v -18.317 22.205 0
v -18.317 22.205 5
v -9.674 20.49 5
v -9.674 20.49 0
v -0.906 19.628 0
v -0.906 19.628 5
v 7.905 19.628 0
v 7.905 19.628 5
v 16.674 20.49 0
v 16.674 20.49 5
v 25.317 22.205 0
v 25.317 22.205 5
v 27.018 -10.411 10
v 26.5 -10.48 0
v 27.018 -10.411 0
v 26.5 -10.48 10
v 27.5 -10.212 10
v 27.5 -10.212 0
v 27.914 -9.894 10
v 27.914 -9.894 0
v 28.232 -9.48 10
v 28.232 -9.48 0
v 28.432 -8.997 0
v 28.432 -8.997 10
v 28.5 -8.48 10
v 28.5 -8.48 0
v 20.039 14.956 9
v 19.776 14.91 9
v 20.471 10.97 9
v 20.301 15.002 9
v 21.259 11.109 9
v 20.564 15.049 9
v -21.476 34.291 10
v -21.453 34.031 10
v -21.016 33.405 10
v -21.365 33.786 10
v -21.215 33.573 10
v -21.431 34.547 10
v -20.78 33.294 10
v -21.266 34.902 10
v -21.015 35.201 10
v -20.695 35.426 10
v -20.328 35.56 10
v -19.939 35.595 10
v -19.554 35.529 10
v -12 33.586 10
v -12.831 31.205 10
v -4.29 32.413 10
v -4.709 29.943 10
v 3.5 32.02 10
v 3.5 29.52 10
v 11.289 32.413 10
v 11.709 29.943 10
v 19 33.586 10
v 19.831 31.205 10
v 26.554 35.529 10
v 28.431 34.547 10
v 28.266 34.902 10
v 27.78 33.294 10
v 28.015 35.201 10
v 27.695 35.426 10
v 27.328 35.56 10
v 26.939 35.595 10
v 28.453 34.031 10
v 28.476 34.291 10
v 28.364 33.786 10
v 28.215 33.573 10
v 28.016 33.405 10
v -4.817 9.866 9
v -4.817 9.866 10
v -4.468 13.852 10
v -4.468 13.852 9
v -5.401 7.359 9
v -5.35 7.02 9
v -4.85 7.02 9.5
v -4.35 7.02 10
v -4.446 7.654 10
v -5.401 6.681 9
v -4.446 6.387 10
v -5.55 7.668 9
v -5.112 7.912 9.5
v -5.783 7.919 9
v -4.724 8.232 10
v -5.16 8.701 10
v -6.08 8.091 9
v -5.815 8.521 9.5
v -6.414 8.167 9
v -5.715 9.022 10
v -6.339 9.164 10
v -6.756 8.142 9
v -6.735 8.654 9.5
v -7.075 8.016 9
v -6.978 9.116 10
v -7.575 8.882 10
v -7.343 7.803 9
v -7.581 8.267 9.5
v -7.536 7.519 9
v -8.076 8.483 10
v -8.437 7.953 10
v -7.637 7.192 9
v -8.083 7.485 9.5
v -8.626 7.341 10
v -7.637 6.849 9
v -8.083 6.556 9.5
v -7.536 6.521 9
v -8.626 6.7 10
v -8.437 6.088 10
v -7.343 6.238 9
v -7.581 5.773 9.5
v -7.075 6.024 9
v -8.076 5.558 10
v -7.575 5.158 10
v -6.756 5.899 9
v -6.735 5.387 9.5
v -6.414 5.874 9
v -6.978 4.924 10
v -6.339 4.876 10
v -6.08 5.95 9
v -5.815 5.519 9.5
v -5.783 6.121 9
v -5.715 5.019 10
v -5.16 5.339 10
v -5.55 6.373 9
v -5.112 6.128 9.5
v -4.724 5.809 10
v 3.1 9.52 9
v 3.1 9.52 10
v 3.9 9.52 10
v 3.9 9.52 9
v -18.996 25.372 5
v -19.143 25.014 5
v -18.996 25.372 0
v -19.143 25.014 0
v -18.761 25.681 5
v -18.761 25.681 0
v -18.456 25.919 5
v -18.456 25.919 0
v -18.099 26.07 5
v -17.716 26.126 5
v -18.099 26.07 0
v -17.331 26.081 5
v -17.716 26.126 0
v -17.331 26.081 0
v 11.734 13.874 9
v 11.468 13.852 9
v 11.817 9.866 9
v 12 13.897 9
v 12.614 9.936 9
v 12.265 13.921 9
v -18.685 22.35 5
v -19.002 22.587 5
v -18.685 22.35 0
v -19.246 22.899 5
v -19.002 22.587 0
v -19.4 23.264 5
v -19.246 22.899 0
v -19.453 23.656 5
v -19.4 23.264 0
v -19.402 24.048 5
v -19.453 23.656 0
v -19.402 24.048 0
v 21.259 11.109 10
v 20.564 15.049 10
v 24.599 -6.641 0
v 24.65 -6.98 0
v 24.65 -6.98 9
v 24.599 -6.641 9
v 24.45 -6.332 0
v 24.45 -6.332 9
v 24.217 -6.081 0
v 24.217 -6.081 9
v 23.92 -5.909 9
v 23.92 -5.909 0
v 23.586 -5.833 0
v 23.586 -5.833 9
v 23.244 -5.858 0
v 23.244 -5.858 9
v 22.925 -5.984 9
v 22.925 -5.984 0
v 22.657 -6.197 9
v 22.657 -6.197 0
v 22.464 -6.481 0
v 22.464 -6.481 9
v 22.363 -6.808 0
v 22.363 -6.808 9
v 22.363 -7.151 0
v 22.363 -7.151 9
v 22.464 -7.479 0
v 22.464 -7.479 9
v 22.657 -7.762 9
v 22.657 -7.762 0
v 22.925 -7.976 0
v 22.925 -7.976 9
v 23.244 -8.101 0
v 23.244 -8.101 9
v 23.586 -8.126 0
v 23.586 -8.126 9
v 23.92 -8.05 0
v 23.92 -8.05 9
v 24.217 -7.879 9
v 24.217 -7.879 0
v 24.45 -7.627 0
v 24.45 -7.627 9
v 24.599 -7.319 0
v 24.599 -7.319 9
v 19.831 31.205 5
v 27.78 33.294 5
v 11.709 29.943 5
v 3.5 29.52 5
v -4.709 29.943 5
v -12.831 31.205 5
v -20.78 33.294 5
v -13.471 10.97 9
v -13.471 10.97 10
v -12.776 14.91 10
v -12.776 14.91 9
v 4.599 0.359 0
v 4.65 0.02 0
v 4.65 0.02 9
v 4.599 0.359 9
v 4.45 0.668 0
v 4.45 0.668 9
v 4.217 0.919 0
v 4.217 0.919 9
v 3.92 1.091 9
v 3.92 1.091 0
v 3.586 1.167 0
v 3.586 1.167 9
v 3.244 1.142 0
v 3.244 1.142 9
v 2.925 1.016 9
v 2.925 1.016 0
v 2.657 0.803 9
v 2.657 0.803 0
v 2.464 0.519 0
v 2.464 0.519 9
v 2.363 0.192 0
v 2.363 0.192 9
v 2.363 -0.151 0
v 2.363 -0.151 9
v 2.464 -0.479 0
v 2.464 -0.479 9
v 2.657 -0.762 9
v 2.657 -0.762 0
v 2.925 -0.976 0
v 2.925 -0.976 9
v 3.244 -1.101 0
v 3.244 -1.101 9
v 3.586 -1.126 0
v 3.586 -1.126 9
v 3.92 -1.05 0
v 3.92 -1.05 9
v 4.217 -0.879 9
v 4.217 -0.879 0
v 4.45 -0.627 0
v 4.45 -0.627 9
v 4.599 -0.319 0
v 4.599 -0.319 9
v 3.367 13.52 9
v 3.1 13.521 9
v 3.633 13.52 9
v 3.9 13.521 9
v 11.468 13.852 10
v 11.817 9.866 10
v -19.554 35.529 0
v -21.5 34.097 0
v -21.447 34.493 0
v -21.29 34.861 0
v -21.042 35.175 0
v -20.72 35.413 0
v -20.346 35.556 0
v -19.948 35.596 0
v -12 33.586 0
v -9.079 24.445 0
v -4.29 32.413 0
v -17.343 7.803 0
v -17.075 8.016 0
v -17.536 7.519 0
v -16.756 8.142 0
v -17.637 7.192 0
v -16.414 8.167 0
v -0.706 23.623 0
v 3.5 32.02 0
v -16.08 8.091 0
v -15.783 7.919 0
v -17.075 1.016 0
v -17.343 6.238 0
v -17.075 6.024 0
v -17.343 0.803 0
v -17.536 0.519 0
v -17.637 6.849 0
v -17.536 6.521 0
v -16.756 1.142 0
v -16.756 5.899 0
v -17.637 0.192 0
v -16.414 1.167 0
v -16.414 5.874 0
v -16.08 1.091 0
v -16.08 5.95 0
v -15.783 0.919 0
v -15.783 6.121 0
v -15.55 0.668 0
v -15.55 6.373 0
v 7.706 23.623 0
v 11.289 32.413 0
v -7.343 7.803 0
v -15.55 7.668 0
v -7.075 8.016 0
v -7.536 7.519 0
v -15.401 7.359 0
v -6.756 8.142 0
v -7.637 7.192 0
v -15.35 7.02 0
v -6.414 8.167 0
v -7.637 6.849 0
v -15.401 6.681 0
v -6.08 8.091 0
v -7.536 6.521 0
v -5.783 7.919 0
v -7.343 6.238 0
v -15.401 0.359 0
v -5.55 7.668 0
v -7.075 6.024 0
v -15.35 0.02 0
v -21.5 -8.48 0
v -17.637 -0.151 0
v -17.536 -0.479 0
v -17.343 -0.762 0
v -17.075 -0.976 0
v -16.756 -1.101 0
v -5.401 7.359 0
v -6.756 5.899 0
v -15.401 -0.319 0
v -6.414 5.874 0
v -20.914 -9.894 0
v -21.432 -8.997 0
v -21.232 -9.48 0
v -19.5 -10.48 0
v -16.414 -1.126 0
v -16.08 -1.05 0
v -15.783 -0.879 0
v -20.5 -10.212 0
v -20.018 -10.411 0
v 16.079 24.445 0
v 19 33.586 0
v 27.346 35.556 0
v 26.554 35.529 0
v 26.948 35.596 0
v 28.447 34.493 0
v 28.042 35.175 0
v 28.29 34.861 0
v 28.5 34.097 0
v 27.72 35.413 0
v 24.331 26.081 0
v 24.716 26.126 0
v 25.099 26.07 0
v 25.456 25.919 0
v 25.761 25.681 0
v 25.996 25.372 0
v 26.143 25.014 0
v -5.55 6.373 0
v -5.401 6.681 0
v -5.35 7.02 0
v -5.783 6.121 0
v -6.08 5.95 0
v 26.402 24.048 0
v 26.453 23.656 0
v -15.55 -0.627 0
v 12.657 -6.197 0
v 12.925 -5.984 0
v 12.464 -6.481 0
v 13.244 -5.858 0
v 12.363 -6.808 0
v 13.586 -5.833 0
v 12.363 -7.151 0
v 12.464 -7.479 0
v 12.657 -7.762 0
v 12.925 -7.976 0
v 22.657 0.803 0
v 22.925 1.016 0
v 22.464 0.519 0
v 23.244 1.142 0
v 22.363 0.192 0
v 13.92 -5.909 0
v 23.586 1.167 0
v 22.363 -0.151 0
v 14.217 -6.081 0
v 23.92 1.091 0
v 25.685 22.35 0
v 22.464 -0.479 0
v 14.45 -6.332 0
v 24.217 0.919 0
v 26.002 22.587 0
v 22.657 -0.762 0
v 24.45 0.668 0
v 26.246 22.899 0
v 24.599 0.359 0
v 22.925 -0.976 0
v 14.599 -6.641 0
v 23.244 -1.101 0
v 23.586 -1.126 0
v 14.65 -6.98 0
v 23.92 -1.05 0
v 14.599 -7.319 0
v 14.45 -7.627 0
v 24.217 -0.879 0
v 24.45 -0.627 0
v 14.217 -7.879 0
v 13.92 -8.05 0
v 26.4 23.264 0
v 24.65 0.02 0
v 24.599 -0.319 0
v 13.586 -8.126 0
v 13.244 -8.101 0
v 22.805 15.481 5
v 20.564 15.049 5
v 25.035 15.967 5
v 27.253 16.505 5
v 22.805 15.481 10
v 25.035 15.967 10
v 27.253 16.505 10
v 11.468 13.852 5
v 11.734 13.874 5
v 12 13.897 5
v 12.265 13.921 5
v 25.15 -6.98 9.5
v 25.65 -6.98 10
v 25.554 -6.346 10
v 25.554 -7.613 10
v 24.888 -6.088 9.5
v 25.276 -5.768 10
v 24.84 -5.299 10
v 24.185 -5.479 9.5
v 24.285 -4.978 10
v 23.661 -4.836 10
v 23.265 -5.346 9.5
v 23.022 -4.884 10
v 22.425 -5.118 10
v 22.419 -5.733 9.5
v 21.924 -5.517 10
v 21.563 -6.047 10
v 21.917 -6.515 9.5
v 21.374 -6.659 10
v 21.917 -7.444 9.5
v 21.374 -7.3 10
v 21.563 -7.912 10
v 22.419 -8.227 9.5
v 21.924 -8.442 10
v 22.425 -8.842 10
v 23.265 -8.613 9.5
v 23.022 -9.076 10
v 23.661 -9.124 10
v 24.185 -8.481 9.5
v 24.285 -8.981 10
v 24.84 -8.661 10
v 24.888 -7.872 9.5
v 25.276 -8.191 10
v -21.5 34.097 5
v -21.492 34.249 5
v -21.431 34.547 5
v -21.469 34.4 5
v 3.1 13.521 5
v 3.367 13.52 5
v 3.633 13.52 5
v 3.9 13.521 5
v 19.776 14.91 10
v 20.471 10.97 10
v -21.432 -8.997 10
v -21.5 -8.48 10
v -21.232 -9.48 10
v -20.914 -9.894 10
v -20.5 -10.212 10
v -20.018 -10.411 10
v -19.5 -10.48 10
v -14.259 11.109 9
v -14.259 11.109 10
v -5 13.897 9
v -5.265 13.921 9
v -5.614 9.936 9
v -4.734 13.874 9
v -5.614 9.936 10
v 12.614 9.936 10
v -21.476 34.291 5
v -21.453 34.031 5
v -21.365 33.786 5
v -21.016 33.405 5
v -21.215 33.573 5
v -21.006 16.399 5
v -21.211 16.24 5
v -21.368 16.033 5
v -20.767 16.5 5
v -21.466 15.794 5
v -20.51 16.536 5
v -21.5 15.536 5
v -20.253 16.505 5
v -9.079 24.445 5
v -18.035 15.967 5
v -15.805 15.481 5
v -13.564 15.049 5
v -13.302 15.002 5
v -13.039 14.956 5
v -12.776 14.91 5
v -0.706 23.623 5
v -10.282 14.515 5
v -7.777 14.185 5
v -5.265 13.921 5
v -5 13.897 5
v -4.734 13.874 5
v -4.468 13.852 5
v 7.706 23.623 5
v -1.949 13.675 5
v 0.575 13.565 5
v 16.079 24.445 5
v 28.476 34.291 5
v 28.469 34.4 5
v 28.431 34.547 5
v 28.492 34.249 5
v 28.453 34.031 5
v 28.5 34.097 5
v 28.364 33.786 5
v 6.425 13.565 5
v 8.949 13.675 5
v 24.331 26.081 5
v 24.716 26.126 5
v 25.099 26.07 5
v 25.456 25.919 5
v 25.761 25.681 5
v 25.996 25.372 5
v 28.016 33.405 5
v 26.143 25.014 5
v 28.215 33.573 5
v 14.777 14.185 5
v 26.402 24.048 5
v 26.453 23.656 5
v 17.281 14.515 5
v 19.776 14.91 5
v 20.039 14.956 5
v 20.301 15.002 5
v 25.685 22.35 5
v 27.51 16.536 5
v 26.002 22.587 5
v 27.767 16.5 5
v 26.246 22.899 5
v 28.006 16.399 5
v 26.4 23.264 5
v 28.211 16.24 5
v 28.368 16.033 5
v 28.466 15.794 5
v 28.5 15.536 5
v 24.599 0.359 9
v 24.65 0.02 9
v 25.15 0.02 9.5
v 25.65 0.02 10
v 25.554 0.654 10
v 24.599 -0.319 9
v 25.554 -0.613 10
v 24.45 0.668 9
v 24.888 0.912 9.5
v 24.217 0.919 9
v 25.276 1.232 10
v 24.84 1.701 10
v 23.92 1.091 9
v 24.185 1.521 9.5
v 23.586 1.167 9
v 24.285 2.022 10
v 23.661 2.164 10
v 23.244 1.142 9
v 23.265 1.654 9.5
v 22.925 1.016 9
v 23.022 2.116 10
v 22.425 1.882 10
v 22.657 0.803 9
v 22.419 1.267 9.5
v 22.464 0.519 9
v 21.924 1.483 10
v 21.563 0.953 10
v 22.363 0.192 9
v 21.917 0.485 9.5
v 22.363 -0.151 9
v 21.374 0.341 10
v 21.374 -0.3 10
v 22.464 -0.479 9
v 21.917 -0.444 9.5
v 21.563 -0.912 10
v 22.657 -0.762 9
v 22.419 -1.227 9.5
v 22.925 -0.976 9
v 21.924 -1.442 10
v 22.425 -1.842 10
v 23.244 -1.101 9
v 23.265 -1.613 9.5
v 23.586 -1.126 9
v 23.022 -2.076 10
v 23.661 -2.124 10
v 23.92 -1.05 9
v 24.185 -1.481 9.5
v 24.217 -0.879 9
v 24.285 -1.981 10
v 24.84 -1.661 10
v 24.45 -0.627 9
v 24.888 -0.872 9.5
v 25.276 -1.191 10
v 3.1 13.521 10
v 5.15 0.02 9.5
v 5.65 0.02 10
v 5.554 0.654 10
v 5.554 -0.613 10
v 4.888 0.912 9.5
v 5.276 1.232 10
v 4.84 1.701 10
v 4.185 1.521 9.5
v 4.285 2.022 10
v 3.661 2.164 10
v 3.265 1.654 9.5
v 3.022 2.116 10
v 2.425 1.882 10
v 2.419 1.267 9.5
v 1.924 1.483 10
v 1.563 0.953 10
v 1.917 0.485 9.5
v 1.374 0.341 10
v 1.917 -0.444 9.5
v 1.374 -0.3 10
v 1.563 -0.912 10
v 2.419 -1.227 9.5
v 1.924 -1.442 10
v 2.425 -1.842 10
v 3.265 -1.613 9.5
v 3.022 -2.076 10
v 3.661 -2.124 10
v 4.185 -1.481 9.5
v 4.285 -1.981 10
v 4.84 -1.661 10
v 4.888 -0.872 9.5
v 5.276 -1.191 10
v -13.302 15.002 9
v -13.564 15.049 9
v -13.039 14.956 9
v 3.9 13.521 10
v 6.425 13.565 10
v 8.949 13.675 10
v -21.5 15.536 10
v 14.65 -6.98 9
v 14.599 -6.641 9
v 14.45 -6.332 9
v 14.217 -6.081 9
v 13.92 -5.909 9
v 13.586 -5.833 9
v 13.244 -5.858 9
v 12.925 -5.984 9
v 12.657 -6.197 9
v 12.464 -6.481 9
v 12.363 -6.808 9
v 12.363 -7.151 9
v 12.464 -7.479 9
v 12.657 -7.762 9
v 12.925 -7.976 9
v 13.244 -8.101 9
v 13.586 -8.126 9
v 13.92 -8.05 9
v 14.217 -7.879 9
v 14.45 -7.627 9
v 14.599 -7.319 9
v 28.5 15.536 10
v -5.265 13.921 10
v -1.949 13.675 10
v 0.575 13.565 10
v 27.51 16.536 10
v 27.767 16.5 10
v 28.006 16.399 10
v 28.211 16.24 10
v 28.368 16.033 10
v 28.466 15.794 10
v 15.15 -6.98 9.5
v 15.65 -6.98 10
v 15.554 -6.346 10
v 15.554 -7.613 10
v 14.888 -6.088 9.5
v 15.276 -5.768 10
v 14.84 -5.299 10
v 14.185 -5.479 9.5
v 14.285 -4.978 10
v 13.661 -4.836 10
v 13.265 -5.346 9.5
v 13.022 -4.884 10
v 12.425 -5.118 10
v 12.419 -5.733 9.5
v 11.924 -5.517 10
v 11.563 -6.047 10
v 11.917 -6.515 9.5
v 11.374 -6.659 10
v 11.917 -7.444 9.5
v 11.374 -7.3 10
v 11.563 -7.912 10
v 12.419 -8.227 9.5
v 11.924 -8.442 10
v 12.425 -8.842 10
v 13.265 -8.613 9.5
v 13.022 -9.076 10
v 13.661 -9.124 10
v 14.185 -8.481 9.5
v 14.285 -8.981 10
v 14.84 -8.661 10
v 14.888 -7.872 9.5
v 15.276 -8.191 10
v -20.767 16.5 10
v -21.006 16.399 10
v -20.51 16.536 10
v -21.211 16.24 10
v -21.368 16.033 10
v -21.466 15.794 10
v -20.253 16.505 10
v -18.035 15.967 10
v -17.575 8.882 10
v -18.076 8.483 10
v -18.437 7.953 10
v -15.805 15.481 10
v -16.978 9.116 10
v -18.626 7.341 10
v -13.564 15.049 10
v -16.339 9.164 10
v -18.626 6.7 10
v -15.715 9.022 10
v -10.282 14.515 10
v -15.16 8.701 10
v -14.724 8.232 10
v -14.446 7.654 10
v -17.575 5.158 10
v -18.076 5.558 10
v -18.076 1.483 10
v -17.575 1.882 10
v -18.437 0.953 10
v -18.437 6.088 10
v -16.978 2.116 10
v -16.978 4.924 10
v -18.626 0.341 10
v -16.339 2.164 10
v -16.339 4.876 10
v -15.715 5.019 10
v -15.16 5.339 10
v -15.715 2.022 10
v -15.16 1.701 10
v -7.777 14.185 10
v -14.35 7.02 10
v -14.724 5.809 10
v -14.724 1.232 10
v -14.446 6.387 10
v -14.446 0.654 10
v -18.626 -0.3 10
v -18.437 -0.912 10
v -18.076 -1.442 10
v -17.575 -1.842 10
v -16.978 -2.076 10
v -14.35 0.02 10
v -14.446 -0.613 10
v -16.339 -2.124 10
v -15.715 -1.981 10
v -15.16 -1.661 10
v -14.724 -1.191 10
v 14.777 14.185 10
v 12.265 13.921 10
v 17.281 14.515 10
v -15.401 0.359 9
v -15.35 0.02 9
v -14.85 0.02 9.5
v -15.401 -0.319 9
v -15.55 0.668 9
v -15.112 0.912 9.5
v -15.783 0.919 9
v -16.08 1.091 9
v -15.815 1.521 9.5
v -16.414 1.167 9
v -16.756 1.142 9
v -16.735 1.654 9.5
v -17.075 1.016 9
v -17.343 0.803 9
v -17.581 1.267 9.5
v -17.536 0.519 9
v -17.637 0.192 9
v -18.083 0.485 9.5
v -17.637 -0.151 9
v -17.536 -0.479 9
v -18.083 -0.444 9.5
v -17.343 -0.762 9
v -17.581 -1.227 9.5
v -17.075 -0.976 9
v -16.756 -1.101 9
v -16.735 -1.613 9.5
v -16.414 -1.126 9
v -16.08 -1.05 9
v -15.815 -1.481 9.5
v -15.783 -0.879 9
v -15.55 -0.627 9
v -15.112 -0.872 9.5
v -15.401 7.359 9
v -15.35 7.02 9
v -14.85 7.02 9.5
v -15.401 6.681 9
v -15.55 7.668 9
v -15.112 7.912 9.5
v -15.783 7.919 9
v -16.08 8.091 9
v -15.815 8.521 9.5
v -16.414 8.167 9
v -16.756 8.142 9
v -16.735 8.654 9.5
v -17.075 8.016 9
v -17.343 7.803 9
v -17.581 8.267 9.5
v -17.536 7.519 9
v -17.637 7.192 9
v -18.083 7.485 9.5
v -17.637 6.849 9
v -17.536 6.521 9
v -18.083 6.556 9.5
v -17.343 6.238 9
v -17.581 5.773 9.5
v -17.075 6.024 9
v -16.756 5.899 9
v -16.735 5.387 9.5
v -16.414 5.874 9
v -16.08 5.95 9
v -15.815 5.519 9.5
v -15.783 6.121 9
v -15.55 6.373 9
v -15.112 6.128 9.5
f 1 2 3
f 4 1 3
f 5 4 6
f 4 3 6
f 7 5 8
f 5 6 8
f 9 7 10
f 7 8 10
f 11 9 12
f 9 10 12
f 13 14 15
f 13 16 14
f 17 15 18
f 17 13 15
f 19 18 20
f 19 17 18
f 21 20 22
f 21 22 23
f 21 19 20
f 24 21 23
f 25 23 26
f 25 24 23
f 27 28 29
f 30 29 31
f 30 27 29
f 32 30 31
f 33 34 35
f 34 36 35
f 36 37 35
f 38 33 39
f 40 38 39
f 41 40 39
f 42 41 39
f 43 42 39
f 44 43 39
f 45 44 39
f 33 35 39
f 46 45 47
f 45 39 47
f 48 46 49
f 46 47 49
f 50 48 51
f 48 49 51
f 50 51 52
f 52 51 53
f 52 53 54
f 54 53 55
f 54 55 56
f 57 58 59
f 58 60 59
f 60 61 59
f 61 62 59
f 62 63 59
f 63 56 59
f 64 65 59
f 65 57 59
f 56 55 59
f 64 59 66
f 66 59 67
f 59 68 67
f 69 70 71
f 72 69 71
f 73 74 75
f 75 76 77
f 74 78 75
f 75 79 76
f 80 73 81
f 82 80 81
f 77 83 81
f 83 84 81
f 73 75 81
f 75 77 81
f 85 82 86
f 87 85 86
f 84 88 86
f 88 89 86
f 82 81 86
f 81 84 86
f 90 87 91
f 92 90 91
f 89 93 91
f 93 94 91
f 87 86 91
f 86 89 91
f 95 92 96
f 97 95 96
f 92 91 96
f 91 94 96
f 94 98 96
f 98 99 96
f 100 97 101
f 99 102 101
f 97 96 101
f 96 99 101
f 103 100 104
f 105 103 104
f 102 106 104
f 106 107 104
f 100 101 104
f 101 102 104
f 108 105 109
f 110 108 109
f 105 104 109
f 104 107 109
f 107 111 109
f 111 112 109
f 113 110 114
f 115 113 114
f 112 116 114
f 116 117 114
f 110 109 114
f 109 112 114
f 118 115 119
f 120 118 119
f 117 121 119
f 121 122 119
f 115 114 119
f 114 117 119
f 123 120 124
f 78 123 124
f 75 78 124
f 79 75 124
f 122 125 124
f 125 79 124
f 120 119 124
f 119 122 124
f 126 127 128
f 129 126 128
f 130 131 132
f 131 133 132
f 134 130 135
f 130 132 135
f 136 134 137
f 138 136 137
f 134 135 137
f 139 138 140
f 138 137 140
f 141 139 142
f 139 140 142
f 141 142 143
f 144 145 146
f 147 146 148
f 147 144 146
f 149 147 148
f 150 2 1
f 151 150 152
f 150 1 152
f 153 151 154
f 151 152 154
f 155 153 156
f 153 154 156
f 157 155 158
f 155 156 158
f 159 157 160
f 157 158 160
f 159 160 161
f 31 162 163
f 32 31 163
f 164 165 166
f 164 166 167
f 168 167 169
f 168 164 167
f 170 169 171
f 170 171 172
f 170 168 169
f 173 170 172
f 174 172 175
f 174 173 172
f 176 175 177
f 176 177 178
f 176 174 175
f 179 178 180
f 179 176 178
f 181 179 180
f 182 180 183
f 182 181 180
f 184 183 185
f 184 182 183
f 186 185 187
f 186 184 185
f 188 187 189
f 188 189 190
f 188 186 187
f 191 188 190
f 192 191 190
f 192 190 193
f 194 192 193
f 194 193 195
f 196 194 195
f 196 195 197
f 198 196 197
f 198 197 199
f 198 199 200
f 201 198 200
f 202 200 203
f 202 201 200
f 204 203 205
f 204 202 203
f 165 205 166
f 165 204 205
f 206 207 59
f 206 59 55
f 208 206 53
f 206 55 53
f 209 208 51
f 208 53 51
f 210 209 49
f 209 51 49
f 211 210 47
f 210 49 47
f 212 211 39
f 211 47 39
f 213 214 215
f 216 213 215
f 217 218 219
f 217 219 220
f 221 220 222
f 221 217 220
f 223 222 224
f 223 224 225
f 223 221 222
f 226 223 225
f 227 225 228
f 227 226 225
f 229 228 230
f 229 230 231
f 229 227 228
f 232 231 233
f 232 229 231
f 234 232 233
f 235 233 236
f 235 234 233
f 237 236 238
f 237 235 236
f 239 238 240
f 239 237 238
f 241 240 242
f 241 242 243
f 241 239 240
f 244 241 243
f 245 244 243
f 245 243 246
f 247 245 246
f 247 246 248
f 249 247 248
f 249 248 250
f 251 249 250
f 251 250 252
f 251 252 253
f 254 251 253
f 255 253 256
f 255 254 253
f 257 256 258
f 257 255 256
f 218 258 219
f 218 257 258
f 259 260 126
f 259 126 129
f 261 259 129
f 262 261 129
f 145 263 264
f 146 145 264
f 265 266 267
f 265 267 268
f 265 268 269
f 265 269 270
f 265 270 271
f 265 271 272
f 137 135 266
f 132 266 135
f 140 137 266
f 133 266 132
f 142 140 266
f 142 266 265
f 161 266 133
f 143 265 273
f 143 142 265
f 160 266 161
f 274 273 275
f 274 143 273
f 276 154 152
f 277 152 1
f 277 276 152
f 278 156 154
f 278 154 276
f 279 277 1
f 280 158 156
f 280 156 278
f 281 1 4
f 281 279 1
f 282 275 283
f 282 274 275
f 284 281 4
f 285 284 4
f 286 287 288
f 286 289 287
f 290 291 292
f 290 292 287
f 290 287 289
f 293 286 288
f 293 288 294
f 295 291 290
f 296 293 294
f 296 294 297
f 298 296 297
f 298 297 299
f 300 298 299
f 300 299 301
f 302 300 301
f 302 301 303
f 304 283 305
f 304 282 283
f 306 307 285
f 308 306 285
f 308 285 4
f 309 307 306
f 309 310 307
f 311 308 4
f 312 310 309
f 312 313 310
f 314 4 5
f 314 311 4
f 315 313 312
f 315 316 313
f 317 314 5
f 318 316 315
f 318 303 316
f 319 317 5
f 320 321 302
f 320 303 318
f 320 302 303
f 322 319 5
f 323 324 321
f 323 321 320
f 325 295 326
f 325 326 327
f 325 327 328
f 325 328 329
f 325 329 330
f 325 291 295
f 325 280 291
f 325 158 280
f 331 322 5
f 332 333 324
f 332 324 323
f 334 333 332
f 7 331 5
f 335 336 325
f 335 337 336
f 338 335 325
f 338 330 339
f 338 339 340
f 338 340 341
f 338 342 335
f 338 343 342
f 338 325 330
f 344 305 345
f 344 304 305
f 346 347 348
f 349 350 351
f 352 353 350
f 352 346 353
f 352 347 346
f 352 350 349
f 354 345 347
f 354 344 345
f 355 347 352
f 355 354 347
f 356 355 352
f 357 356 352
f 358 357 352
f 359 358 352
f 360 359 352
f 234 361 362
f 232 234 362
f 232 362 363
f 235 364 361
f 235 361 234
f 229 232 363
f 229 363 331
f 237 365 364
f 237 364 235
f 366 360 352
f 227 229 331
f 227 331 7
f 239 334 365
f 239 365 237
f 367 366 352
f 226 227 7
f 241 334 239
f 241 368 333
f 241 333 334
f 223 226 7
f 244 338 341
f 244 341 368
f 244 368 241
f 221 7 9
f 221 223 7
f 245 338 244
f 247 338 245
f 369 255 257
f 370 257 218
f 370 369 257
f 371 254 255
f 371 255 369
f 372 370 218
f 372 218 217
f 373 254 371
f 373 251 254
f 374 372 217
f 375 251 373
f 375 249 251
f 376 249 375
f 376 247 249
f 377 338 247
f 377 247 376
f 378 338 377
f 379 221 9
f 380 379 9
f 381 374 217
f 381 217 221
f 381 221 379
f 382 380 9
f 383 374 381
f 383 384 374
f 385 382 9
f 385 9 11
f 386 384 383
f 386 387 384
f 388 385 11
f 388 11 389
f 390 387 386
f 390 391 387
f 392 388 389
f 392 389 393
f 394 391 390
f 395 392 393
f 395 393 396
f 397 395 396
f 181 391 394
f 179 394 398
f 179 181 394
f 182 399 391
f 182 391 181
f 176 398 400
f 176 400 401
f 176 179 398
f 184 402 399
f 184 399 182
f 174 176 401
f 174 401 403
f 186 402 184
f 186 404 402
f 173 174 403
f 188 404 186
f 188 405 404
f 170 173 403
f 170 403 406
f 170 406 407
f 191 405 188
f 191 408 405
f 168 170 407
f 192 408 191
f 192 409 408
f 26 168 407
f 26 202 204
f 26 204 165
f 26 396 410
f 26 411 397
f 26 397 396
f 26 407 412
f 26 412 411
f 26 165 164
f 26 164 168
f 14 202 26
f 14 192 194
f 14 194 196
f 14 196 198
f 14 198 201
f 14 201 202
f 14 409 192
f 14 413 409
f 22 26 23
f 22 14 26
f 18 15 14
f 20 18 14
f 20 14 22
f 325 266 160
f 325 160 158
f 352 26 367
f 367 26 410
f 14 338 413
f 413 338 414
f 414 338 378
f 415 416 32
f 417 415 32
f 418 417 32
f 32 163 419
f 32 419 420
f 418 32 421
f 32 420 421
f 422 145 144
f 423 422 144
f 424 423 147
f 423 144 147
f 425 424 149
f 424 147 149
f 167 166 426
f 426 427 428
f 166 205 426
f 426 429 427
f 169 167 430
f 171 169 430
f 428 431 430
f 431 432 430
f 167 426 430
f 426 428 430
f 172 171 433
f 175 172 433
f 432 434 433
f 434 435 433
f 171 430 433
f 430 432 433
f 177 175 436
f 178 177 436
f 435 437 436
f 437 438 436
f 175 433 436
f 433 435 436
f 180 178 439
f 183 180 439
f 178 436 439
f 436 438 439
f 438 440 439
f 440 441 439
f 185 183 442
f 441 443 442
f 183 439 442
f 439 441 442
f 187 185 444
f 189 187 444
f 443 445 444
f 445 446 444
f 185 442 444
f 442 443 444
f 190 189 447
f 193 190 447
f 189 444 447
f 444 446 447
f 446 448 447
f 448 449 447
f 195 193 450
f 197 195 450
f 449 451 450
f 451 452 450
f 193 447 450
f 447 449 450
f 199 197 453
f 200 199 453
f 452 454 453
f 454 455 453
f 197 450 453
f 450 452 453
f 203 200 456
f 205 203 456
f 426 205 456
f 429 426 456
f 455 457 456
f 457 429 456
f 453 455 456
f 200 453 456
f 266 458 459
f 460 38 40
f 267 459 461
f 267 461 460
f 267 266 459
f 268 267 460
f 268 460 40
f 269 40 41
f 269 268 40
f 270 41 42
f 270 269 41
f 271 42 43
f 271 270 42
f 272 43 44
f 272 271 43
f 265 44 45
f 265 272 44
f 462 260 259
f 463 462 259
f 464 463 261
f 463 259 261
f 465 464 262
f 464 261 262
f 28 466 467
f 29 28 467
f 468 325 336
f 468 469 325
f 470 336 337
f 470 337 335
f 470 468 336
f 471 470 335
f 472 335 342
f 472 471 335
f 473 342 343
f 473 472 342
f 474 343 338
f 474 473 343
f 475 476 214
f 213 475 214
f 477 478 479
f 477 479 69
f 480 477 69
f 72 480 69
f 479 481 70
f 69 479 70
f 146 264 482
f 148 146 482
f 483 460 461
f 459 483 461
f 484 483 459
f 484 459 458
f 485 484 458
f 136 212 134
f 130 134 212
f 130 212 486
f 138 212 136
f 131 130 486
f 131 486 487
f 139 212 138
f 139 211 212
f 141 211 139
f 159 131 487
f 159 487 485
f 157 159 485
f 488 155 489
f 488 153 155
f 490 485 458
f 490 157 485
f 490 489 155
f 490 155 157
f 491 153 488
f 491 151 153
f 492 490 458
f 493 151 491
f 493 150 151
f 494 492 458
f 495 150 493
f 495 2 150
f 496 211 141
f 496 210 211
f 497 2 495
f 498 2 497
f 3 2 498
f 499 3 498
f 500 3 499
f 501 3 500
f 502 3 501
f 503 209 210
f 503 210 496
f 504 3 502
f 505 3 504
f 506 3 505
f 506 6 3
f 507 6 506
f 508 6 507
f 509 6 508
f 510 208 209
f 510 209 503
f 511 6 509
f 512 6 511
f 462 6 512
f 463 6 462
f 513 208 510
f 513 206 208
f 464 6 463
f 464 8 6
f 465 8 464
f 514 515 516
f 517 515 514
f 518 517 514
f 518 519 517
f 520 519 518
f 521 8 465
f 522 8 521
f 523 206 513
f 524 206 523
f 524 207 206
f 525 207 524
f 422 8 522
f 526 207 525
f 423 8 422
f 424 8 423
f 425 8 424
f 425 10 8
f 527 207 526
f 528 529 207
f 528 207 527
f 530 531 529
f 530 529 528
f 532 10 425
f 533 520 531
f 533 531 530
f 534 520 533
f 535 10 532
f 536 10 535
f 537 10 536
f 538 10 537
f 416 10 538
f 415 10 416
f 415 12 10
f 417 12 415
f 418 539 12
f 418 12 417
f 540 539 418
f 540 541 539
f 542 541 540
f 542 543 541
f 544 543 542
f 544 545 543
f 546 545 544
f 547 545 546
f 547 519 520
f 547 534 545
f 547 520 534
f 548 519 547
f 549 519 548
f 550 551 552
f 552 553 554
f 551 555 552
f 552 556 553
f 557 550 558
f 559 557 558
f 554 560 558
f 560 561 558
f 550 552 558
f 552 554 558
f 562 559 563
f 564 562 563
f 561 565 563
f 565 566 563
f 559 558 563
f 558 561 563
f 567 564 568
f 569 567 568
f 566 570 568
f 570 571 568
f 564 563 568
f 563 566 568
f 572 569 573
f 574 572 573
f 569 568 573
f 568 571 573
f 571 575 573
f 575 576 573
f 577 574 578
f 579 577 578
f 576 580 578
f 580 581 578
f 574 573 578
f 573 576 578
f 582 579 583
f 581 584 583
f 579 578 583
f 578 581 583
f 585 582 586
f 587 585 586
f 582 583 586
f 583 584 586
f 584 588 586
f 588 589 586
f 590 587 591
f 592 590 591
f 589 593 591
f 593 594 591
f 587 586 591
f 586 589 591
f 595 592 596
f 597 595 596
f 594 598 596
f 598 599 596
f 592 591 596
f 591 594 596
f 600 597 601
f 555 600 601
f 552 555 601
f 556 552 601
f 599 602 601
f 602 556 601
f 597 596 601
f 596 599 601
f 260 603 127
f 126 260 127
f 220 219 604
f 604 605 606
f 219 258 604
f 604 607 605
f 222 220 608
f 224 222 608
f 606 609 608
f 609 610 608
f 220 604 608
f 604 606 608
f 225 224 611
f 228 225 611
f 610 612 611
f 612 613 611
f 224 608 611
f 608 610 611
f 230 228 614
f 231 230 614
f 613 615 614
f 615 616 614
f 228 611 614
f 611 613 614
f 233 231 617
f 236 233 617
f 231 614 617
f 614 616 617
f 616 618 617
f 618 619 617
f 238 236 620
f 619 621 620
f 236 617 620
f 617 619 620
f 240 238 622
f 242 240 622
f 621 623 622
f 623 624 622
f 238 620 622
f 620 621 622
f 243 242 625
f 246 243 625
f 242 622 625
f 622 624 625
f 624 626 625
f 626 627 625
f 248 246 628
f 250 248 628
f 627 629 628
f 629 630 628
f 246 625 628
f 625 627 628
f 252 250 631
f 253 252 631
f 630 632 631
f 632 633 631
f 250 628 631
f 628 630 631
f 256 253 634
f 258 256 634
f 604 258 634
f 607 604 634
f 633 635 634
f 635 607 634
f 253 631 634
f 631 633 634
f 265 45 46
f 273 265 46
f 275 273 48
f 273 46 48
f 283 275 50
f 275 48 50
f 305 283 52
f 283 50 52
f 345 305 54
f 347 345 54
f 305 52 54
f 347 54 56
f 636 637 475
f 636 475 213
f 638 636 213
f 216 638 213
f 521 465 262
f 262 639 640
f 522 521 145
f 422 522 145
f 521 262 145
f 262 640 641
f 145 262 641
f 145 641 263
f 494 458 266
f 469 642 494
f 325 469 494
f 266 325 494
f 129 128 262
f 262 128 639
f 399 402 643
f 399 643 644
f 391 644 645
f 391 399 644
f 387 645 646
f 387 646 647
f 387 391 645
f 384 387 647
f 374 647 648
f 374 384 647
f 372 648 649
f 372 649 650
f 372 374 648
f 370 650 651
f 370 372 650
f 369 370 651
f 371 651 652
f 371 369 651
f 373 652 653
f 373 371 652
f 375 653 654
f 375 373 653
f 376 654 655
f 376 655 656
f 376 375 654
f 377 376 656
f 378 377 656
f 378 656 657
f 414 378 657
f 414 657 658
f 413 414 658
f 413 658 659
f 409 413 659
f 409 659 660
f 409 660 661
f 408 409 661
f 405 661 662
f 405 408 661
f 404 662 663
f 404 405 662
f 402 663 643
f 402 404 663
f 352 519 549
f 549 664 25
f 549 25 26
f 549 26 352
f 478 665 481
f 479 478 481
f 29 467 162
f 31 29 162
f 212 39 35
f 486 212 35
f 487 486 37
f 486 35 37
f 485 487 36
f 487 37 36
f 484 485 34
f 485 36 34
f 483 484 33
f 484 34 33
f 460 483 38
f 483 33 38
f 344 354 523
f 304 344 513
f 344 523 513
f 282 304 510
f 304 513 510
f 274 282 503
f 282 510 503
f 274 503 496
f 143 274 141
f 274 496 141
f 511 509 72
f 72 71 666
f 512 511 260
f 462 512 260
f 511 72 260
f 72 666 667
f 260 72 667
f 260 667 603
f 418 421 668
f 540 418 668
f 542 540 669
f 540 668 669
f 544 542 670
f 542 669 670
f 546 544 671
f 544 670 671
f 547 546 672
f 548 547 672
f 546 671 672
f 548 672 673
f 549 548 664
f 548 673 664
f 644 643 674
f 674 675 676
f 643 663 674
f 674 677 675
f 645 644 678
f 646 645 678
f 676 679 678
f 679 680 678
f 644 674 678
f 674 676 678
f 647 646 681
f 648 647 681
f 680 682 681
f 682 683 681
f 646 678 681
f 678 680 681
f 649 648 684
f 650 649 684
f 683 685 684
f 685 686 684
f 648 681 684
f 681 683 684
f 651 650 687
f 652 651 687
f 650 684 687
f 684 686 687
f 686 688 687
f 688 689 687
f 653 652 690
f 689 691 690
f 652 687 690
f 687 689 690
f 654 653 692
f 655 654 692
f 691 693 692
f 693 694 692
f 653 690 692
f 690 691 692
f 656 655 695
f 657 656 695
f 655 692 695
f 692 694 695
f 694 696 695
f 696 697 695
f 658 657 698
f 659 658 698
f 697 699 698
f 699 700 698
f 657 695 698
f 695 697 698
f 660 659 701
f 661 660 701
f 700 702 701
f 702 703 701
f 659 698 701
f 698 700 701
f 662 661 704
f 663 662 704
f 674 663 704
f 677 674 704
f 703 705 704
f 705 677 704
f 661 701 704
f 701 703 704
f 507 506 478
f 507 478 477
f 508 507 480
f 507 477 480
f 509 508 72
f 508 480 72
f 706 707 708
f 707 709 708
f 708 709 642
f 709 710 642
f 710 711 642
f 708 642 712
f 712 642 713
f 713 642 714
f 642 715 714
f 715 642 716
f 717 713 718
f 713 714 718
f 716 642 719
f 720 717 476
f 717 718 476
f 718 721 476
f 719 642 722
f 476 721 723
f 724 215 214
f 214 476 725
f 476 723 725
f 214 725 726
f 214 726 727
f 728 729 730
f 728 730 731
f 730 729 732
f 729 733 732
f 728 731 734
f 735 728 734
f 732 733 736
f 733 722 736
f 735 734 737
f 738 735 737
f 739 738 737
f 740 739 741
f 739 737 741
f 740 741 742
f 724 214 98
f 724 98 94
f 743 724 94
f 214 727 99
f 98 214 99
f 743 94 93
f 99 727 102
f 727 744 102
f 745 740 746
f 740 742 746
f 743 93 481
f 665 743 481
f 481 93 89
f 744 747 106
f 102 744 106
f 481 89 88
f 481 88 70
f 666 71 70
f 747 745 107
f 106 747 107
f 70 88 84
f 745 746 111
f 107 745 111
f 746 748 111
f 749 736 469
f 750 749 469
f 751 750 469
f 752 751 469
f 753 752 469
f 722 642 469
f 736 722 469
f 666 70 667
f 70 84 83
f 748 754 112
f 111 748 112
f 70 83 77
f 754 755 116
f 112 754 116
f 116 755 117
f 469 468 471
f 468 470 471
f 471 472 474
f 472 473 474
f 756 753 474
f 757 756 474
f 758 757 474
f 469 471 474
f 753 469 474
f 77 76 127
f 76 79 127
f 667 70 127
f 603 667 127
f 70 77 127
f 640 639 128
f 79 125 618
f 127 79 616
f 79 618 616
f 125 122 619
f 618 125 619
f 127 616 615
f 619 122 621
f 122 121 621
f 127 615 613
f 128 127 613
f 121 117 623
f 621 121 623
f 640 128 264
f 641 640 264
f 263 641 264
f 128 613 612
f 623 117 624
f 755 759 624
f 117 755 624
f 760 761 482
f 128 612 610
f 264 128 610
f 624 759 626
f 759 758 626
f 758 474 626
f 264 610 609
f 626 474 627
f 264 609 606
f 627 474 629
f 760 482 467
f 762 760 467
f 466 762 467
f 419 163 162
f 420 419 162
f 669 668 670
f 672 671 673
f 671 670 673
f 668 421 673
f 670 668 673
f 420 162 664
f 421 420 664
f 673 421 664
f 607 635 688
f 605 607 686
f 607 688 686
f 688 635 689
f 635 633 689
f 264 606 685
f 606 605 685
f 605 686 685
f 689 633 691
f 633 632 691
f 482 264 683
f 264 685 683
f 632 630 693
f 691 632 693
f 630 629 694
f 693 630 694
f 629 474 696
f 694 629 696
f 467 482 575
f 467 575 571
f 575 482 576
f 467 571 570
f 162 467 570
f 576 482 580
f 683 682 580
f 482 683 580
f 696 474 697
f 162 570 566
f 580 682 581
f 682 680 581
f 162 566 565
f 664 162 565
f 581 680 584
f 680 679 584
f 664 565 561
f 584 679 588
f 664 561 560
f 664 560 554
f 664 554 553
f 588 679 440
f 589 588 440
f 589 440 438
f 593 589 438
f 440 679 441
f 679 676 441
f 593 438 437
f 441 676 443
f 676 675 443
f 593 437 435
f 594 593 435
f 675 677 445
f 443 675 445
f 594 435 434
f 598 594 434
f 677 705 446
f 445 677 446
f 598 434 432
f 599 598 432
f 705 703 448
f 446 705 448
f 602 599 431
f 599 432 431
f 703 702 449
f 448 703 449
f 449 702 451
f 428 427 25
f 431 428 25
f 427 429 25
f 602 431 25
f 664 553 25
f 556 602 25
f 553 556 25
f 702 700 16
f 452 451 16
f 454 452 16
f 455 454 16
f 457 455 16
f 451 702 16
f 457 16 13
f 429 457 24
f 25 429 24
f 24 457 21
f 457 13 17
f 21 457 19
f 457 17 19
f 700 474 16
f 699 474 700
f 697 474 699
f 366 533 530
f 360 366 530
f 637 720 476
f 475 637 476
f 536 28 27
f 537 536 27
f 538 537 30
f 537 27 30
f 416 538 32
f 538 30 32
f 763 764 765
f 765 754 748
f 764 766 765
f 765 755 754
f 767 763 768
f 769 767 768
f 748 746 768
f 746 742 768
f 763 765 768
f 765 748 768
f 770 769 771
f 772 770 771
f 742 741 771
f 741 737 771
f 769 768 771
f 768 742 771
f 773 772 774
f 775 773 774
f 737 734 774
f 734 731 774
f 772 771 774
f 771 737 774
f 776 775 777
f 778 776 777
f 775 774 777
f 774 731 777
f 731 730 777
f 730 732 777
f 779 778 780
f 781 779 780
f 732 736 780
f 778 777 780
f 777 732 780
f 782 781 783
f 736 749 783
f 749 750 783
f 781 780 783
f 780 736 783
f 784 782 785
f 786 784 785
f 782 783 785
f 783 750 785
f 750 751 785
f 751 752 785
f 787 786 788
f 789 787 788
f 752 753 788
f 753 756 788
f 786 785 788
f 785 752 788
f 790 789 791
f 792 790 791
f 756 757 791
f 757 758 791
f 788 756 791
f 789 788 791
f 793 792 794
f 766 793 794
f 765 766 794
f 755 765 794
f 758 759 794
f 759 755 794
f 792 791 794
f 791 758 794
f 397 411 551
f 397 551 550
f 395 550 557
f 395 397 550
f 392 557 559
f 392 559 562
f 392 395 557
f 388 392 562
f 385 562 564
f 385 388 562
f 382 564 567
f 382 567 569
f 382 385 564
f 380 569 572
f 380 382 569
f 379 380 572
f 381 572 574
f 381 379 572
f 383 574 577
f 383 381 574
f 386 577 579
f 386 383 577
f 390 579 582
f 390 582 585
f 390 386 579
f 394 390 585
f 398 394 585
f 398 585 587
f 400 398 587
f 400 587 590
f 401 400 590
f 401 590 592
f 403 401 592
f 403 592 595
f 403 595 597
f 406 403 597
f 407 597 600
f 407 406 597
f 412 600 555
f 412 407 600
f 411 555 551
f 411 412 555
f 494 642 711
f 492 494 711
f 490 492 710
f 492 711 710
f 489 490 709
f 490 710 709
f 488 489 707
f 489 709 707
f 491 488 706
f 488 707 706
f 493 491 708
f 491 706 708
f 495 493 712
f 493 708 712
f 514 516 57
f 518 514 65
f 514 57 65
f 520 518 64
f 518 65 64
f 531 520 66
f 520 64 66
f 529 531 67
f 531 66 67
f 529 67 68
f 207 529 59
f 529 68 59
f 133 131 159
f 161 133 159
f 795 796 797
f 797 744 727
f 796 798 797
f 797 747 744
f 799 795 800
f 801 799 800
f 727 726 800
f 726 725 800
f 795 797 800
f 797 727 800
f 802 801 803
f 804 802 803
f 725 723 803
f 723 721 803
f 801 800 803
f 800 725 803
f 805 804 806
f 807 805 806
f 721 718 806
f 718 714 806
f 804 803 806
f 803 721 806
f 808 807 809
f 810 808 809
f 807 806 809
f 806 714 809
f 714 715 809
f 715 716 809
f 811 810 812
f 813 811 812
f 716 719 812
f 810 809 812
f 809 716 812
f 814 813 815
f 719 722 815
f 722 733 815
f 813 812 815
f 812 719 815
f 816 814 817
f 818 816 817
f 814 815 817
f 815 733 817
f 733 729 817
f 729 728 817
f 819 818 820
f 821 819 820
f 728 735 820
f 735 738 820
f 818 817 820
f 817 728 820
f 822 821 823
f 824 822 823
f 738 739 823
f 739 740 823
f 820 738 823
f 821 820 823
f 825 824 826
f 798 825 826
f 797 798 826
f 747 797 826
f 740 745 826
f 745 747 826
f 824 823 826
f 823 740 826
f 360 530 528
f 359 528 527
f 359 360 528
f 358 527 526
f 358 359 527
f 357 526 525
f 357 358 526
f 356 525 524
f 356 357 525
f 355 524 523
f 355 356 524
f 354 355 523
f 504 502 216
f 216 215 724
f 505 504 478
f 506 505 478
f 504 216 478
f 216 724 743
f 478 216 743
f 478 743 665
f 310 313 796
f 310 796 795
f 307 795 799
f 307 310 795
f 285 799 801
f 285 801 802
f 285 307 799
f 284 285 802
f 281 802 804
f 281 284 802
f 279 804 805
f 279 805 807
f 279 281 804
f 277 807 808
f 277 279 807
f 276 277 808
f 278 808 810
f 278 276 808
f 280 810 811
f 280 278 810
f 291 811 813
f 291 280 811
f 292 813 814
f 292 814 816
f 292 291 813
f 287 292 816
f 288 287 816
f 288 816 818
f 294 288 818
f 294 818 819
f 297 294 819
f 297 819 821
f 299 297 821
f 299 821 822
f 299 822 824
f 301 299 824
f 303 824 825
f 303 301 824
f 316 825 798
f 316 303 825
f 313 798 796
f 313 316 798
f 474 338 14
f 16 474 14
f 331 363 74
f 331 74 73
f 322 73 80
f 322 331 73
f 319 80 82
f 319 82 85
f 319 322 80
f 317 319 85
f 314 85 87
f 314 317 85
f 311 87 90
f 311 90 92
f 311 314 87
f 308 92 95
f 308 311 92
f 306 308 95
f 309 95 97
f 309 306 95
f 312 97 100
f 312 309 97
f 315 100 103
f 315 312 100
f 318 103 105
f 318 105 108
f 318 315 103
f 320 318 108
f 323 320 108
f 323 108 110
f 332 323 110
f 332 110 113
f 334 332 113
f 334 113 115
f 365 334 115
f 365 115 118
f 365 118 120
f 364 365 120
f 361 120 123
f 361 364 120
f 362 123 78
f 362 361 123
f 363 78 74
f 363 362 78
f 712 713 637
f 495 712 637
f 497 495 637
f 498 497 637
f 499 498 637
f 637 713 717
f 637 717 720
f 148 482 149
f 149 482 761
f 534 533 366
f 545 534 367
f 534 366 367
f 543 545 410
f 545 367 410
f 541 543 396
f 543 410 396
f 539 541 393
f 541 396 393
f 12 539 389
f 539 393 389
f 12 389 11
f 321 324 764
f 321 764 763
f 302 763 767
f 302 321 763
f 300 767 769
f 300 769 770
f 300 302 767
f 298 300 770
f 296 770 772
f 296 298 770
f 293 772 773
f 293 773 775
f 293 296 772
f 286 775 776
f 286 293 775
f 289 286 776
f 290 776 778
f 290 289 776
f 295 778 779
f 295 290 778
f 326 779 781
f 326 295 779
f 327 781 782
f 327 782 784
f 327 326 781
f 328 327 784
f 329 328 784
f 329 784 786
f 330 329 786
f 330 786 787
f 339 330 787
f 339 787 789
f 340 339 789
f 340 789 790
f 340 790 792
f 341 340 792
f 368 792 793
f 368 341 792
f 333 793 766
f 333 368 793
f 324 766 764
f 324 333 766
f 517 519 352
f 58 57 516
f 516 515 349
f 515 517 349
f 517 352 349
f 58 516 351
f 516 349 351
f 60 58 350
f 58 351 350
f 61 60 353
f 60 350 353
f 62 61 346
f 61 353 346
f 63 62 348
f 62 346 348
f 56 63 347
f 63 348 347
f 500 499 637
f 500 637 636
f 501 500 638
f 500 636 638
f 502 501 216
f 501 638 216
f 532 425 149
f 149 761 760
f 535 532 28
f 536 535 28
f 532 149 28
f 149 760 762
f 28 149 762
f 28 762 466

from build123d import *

# Parameters (mm, degrees)
SKETCH1_W           = 50
SKETCH1_H           = 21
SKETCH1_R           = 1.15
BOSS_EXTRUDE4_DEPTH = 10
CHAMFER2_SIZE       = 1
FILLET2_R           = 2
SKETCH2_W           = 50
SKETCH2_H           = 10
BOSS_EXTRUDE5_DEPTH = 40
CUT_EXTRUDE1_DEPTH  = 73
CUT_EXTRUDE2_DEPTH  = 5
CUT_EXTRUDE3_DEPTH  = 1
FILLET4_R           = 1.5
FILLET6_R           = 1.5
FILLET7_R           = 1


with BuildPart() as part:
    # Sketch1 → Boss-Extrude4 (new body)
    with BuildSketch(Plane.XY):
        with Locations((3.499954481, 0.020373254)):
            Rectangle(SKETCH1_W, SKETCH1_H)
        with Locations((-16.500045519, 0.020373254)):
            Circle(SKETCH1_R, mode=Mode.SUBTRACT)
        with Locations((13.499954481, -6.979626746)):
            Circle(SKETCH1_R, mode=Mode.SUBTRACT)
        with Locations((23.499954481, -6.979626746)):
            Circle(SKETCH1_R, mode=Mode.SUBTRACT)
        with Locations((-16.500045519, 7.020373254)):
            Circle(SKETCH1_R, mode=Mode.SUBTRACT)
        with Locations((-6.500045519, 7.020373254)):
            Circle(SKETCH1_R, mode=Mode.SUBTRACT)
        with Locations((3.499954481, 0.020373254)):
            Circle(SKETCH1_R, mode=Mode.SUBTRACT)
        with Locations((23.499954481, 0.020373254)):
            Circle(SKETCH1_R, mode=Mode.SUBTRACT)
    extrude(amount=BOSS_EXTRUDE4_DEPTH)

    # Chamfer2
    chamfer2_edges = [part.edges().sort_by_distance(p)[0] for p in [
        (22.349954481, 0.020373254, 10),
        (-17.650045519, 0.020373254, 10),
        (-17.650045519, 7.020373254, 10),
        (-7.650045519, 7.020373254, 10),
        (22.349954481, -6.979626746, 10),
        (12.349954481, -6.979626746, 10),
        (2.349954481, 0.020373254, 10),
    ]]
    chamfer(chamfer2_edges, length=CHAMFER2_SIZE)

    # Fillet2
    fillet2_edges = [part.edges().sort_by_distance(p)[0] for p in [
        (28.499954481, -10.479626746, 5),
        (-21.500045519, -10.479626746, 5),
    ]]
    fillet(fillet2_edges, radius=FILLET2_R)

    # Sketch2 → Boss-Extrude5 (add)
    with BuildSketch(Plane(origin=(0, 10.520373254, 0), x_dir=(1, 0, 0), z_dir=(0, 1, 0))):
        with Locations((3.499954481, -5)):
            Rectangle(SKETCH2_W, SKETCH2_H)
    extrude(amount=BOSS_EXTRUDE5_DEPTH)

    # Sketch4 → Cut-Extrude1 (cut)
    with BuildSketch(Plane.XY.offset(10)):
        with BuildLine():
            Line((26.79366854, 22.587048888), (25.75839236, 26.450752193))
            ThreePointArc((25.75839236, 26.450752193), (3.499954481, 23.520373254), (-18.758483398, 26.450752193))
            Line((-18.758483398, 26.450752193), (-19.793759578, 22.587048888))
            ThreePointArc((-19.793759578, 22.587048888), (3.499954481, 19.520373254), (26.79366854, 22.587048888))
        make_face()
        with BuildLine():
            ThreePointArc((-21.500045519, 36.163369499), (3.499954481, 32.020373254), (28.499954481, 36.163369499))
            Line((28.499954481, 36.163369499), (28.499954481, 50.520373254))
            Line((28.499954481, 50.520373254), (-21.500045519, 50.520373254))
            Line((-21.500045519, 50.520373254), (-21.500045519, 36.163369499))
        make_face()
    extrude(amount=-CUT_EXTRUDE1_DEPTH, mode=Mode.SUBTRACT)

    # Sketch4<3> → Cut-Extrude2 (cut)
    with BuildSketch(Plane.XY.offset(10)):
        with BuildLine():
            Line((28.499954481, 17.764584387), (28.499954481, 23.062290925))
            ThreePointArc((28.499954481, 23.062290925), (27.647980656, 22.820472263), (26.79366854, 22.587048888))
            ThreePointArc((26.79366854, 22.587048888), (3.499954481, 19.520373254), (-19.793759578, 22.587048888))
            ThreePointArc((-19.793759578, 22.587048888), (-20.648071694, 22.820472263), (-21.500045519, 23.062290925))
            Line((-21.500045519, 23.062290925), (-21.500045519, 17.764584387))
            Line((-21.500045519, 17.764584387), (-20.697767999, 20.758724854))
            Line((-20.697767999, 20.758724854), (-19.925027338, 20.551669618))
            Line((-19.925027338, 20.551669618), (-20.960087835, 16.688771254))
            ThreePointArc((-20.960087835, 16.688771254), (-17.278248457, 15.795956571), (-13.564048969, 15.049108913))
            Line((-13.564048969, 15.049108913), (-12.869600966, 18.987519248))
            Line((-12.869600966, 18.987519248), (-12.081754763, 18.848600706))
            Line((-12.081754763, 18.848600706), (-12.776202766, 14.910190371))
            ThreePointArc((-12.776202766, 14.910190371), (-9.030559972, 14.341666562), (-5.265402072, 13.9213747))
            Line((-5.265402072, 13.9213747), (-4.916851731, 17.905323327))
            Line((-4.916851731, 17.905323327), (-4.119895973, 17.835598733))
            Line((-4.119895973, 17.835598733), (-4.468446314, 13.851650106))
            ThreePointArc((-4.468446314, 13.851650106), (-0.687506706, 13.611743982), (3.099954481, 13.521206591))
            Line((3.099954481, 13.521206591), (3.099954481, 17.520373254))
            Line((3.099954481, 17.520373254), (3.899954481, 17.520373254))
            Line((3.899954481, 17.520373254), (3.899954481, 13.521206591))
            ThreePointArc((3.899954481, 13.521206591), (7.687415668, 13.611743982), (11.468355275, 13.851650106))
            Line((11.468355275, 13.851650106), (11.119804934, 17.835598733))
            Line((11.119804934, 17.835598733), (11.916760693, 17.905323327))
            Line((11.916760693, 17.905323327), (12.265311034, 13.9213747))
            ThreePointArc((12.265311034, 13.9213747), (16.030468934, 14.341666562), (19.776111728, 14.910190371))
            Line((19.776111728, 14.910190371), (19.081663725, 18.848600706))
            Line((19.081663725, 18.848600706), (19.869509927, 18.987519248))
            Line((19.869509927, 18.987519248), (20.563957931, 15.049108913))
            ThreePointArc((20.563957931, 15.049108913), (24.278157419, 15.795956571), (27.959996797, 16.688771254))
            Line((27.959996797, 16.688771254), (26.9249363, 20.551669618))
            Line((26.9249363, 20.551669618), (27.697676961, 20.758724854))
            Line((27.697676961, 20.758724854), (28.499954481, 17.764584387))
        make_face()
        with BuildLine():
            ThreePointArc((25.75839236, 26.450752193), (27.132420907, 26.831156723), (28.499954481, 27.234286946))
            Line((28.499954481, 27.234286946), (28.499954481, 33.526952486))
            ThreePointArc((28.499954481, 33.526952486), (3.499954481, 29.520373254), (-21.500045519, 33.526952486))
            Line((-21.500045519, 33.526952486), (-21.500045519, 27.234286946))
            ThreePointArc((-21.500045519, 27.234286946), (-20.132511945, 26.831156723), (-18.758483398, 26.450752193))
            ThreePointArc((-18.758483398, 26.450752193), (3.499954481, 23.520373254), (25.75839236, 26.450752193))
        make_face()
        with BuildLine():
            Line((28.499954481, 23.062290925), (28.499954481, 27.234286946))
            ThreePointArc((28.499954481, 27.234286946), (27.132420907, 26.831156723), (25.75839236, 26.450752193))
            Line((25.75839236, 26.450752193), (26.79366854, 22.587048888))
            ThreePointArc((26.79366854, 22.587048888), (27.647980656, 22.820472263), (28.499954481, 23.062290925))
        make_face()
        with BuildLine():
            ThreePointArc((-18.758483398, 26.450752193), (-20.132511945, 26.831156723), (-21.500045519, 27.234286946))
            Line((-21.500045519, 27.234286946), (-21.500045519, 23.062290925))
            ThreePointArc((-21.500045519, 23.062290925), (-20.648071694, 22.820472263), (-19.793759578, 22.587048888))
            Line((-19.793759578, 22.587048888), (-18.758483398, 26.450752193))
        make_face()
        with BuildLine():
            Line((28.499954481, 16.832725749), (28.499954481, 17.764584387))
            Line((28.499954481, 17.764584387), (27.697676961, 20.758724854))
            Line((27.697676961, 20.758724854), (26.9249363, 20.551669618))
            Line((26.9249363, 20.551669618), (27.959996797, 16.688771254))
            ThreePointArc((27.959996797, 16.688771254), (28.230080384, 16.760355613), (28.499954481, 16.832725749))
        make_face()
        with BuildLine():
            ThreePointArc((19.776111728, 14.910190371), (20.170179537, 14.978828965), (20.563957931, 15.049108913))
            Line((20.563957931, 15.049108913), (19.869509927, 18.987519248))
            Line((19.869509927, 18.987519248), (19.081663725, 18.848600706))
            Line((19.081663725, 18.848600706), (19.776111728, 14.910190371))
        make_face()
        with BuildLine():
            ThreePointArc((11.468355275, 13.851650106), (11.866905785, 13.885682238), (12.265311034, 13.9213747))
            Line((12.265311034, 13.9213747), (11.916760693, 17.905323327))
            Line((11.916760693, 17.905323327), (11.119804934, 17.835598733))
            Line((11.119804934, 17.835598733), (11.468355275, 13.851650106))
        make_face()
        with BuildLine():
            ThreePointArc((3.099954481, 13.521206591), (3.499954481, 13.520373254), (3.899954481, 13.521206591))
            Line((3.899954481, 13.521206591), (3.899954481, 17.520373254))
            Line((3.899954481, 17.520373254), (3.099954481, 17.520373254))
            Line((3.099954481, 17.520373254), (3.099954481, 13.521206591))
        make_face()
        with BuildLine():
            Line((-4.916851731, 17.905323327), (-5.265402072, 13.9213747))
            ThreePointArc((-5.265402072, 13.9213747), (-4.866996823, 13.885682238), (-4.468446314, 13.851650106))
            Line((-4.468446314, 13.851650106), (-4.119895973, 17.835598733))
            Line((-4.119895973, 17.835598733), (-4.916851731, 17.905323327))
        make_face()
        with BuildLine():
            Line((-12.869600966, 18.987519248), (-13.564048969, 15.049108913))
            ThreePointArc((-13.564048969, 15.049108913), (-13.170270575, 14.978828965), (-12.776202766, 14.910190371))
            Line((-12.776202766, 14.910190371), (-12.081754763, 18.848600706))
            Line((-12.081754763, 18.848600706), (-12.869600966, 18.987519248))
        make_face()
        with BuildLine():
            Line((-20.697767999, 20.758724854), (-21.500045519, 17.764584387))
            Line((-21.500045519, 17.764584387), (-21.500045519, 16.832725749))
            ThreePointArc((-21.500045519, 16.832725749), (-21.230171422, 16.760355613), (-20.960087835, 16.688771254))
            Line((-20.960087835, 16.688771254), (-19.925027338, 20.551669618))
            Line((-19.925027338, 20.551669618), (-20.697767999, 20.758724854))
        make_face()
    extrude(amount=-CUT_EXTRUDE2_DEPTH, mode=Mode.SUBTRACT)

    # Sketch4<4> → Cut-Extrude3 (cut)
    with BuildSketch(Plane.XY.offset(10)):
        with BuildLine():
            Line((3.899954481, 9.520373254), (3.899954481, 13.521206591))
            ThreePointArc((3.899954481, 13.521206591), (3.499954481, 13.520373254), (3.099954481, 13.521206591))
            Line((3.099954481, 13.521206591), (3.099954481, 9.520373254))
            Line((3.099954481, 9.520373254), (3.899954481, 9.520373254))
        make_face()
        with BuildLine():
            ThreePointArc((12.265311034, 13.9213747), (11.866905785, 13.885682238), (11.468355275, 13.851650106))
            Line((11.468355275, 13.851650106), (11.817050876, 9.866041148))
            Line((11.817050876, 9.866041148), (12.614006635, 9.935765742))
            Line((12.614006635, 9.935765742), (12.265311034, 13.9213747))
        make_face()
        with BuildLine():
            Line((-4.817141915, 9.866041148), (-4.468446314, 13.851650106))
            ThreePointArc((-4.468446314, 13.851650106), (-4.866996823, 13.885682238), (-5.265402072, 13.9213747))
            Line((-5.265402072, 13.9213747), (-5.614097673, 9.935765742))
            Line((-5.614097673, 9.935765742), (-4.817141915, 9.866041148))
        make_face()
        with BuildLine():
            ThreePointArc((20.563957931, 15.049108913), (20.170179537, 14.978828965), (19.776111728, 14.910190371))
            Line((19.776111728, 14.910190371), (20.470849146, 10.970138682))
            Line((20.470849146, 10.970138682), (21.258695349, 11.109057224))
            Line((21.258695349, 11.109057224), (20.563957931, 15.049108913))
        make_face()
        with BuildLine():
            Line((-13.470940185, 10.970138682), (-12.776202766, 14.910190371))
            ThreePointArc((-12.776202766, 14.910190371), (-13.170270575, 14.978828965), (-13.564048969, 15.049108913))
            Line((-13.564048969, 15.049108913), (-14.258786387, 11.109057224))
            Line((-14.258786387, 11.109057224), (-13.470940185, 10.970138682))
        make_face()
    extrude(amount=-CUT_EXTRUDE3_DEPTH, mode=Mode.SUBTRACT)

    # Fillet4
    fillet4_edges = [part.edges().sort_by_distance(p)[0] for p in [
        (-18.758483398, 26.450752193, 2.5),
        (25.75839236, 26.450752193, 2.5),
        (26.79366854, 22.587048888, 2.5),
        (-19.793759578, 22.587048888, 2.5),
    ]]
    fillet(fillet4_edges, radius=FILLET4_R)

    # Fillet6
    fillet6_edges = [part.edges().sort_by_distance(p)[0] for p in [
        (28.499954481, 36.163369499, 5),
        (-21.500045519, 36.163369499, 5),
    ]]
    fillet(fillet6_edges, radius=FILLET6_R)

    # Fillet7
    # the kernel refuses this fillet: 1 mm, written as the material it takes off along each edge
    with BuildSketch(Plane(origin=(28.499954481, 33.526952486, 12.556756315), x_dir=(-0.0677828444913723, 0.9977000982222356, 0), z_dir=(0, 0, -1))) as fillet7_piece_1:
        with BuildLine():
            CenterArc((0.787555748, -0.971959872), FILLET7_R, 76.399725049, 89.818683939)
            Line((-0.183655122, -0.73373845), (-0.280776209, -0.709916308))
            ThreePointArc((-0.280776209, -0.709916308), (-0.189702109, -0.342371174), (-0.096891518, 0.024739315))
            Line((-0.096891518, 0.024739315), (-0.006778284, 0.09977001))
            ThreePointArc((-0.006778284, 0.09977001), (0.561529809, 0.138380349), (1.046217204, 0.097195987))
            Line((1.046217204, 0.097195987), (1.022702526, 0))
        make_face()
    extrude(amount=7.556756315, mode=Mode.SUBTRACT)
    with BuildSketch(Plane(origin=(28.499954481, 16.832725749, 13.240984234), x_dir=(0, -1, 0), z_dir=(0, 0, -1))) as fillet7_piece_2:
        with BuildLine():
            CenterArc((1.296393694, 1), FILLET7_R, 165.67494806, 104.32505194)
            ThreePointArc((0.327486052, 1.24742268), (0.165837833, 0.62316139), (0, 0))
            Line((0, 0), (1.296393694, 0))
        make_face()
    extrude(amount=8.240984234, mode=Mode.SUBTRACT)
    with BuildSketch(Plane(origin=(-21.500045519, 16.832725749, 13.240984234), x_dir=(0, -1, 0), z_dir=(0, 0, -1))) as fillet7_piece_3:
        with BuildLine():
            CenterArc((1.296393694, -1), FILLET7_R, 90, 104.32505194)
            ThreePointArc((0.327486052, -1.24742268), (0.165837833, -0.62316139), (0, 0))
            Line((0, 0), (1.296393694, 0))
        make_face()
    extrude(amount=8.240984234, mode=Mode.SUBTRACT)
    with BuildSketch(Plane(origin=(-21.500045519, 33.526952486, 12.556756315), x_dir=(0.0677828444913778, 0.9977000982222352, 0), z_dir=(0, 0, -1))) as fillet7_piece_4:
        with BuildLine():
            CenterArc((0.787555748, 0.971959872), FILLET7_R, 193.781591011, 89.818683939)
            Line((-0.183655122, 0.73373845), (-0.280776209, 0.709916308))
            ThreePointArc((-0.280776209, 0.709916308), (-0.189702109, 0.342371174), (-0.096891518, -0.024739315))
            Line((-0.096891518, -0.024739315), (-0.006778284, -0.09977001))
            ThreePointArc((-0.006778284, -0.09977001), (0.561529809, -0.138380349), (1.046217204, -0.097195987))
            Line((1.046217204, -0.097195987), (1.022702526, 0))
        make_face()
    extrude(amount=7.556756315, mode=Mode.SUBTRACT)


solid = part.part
